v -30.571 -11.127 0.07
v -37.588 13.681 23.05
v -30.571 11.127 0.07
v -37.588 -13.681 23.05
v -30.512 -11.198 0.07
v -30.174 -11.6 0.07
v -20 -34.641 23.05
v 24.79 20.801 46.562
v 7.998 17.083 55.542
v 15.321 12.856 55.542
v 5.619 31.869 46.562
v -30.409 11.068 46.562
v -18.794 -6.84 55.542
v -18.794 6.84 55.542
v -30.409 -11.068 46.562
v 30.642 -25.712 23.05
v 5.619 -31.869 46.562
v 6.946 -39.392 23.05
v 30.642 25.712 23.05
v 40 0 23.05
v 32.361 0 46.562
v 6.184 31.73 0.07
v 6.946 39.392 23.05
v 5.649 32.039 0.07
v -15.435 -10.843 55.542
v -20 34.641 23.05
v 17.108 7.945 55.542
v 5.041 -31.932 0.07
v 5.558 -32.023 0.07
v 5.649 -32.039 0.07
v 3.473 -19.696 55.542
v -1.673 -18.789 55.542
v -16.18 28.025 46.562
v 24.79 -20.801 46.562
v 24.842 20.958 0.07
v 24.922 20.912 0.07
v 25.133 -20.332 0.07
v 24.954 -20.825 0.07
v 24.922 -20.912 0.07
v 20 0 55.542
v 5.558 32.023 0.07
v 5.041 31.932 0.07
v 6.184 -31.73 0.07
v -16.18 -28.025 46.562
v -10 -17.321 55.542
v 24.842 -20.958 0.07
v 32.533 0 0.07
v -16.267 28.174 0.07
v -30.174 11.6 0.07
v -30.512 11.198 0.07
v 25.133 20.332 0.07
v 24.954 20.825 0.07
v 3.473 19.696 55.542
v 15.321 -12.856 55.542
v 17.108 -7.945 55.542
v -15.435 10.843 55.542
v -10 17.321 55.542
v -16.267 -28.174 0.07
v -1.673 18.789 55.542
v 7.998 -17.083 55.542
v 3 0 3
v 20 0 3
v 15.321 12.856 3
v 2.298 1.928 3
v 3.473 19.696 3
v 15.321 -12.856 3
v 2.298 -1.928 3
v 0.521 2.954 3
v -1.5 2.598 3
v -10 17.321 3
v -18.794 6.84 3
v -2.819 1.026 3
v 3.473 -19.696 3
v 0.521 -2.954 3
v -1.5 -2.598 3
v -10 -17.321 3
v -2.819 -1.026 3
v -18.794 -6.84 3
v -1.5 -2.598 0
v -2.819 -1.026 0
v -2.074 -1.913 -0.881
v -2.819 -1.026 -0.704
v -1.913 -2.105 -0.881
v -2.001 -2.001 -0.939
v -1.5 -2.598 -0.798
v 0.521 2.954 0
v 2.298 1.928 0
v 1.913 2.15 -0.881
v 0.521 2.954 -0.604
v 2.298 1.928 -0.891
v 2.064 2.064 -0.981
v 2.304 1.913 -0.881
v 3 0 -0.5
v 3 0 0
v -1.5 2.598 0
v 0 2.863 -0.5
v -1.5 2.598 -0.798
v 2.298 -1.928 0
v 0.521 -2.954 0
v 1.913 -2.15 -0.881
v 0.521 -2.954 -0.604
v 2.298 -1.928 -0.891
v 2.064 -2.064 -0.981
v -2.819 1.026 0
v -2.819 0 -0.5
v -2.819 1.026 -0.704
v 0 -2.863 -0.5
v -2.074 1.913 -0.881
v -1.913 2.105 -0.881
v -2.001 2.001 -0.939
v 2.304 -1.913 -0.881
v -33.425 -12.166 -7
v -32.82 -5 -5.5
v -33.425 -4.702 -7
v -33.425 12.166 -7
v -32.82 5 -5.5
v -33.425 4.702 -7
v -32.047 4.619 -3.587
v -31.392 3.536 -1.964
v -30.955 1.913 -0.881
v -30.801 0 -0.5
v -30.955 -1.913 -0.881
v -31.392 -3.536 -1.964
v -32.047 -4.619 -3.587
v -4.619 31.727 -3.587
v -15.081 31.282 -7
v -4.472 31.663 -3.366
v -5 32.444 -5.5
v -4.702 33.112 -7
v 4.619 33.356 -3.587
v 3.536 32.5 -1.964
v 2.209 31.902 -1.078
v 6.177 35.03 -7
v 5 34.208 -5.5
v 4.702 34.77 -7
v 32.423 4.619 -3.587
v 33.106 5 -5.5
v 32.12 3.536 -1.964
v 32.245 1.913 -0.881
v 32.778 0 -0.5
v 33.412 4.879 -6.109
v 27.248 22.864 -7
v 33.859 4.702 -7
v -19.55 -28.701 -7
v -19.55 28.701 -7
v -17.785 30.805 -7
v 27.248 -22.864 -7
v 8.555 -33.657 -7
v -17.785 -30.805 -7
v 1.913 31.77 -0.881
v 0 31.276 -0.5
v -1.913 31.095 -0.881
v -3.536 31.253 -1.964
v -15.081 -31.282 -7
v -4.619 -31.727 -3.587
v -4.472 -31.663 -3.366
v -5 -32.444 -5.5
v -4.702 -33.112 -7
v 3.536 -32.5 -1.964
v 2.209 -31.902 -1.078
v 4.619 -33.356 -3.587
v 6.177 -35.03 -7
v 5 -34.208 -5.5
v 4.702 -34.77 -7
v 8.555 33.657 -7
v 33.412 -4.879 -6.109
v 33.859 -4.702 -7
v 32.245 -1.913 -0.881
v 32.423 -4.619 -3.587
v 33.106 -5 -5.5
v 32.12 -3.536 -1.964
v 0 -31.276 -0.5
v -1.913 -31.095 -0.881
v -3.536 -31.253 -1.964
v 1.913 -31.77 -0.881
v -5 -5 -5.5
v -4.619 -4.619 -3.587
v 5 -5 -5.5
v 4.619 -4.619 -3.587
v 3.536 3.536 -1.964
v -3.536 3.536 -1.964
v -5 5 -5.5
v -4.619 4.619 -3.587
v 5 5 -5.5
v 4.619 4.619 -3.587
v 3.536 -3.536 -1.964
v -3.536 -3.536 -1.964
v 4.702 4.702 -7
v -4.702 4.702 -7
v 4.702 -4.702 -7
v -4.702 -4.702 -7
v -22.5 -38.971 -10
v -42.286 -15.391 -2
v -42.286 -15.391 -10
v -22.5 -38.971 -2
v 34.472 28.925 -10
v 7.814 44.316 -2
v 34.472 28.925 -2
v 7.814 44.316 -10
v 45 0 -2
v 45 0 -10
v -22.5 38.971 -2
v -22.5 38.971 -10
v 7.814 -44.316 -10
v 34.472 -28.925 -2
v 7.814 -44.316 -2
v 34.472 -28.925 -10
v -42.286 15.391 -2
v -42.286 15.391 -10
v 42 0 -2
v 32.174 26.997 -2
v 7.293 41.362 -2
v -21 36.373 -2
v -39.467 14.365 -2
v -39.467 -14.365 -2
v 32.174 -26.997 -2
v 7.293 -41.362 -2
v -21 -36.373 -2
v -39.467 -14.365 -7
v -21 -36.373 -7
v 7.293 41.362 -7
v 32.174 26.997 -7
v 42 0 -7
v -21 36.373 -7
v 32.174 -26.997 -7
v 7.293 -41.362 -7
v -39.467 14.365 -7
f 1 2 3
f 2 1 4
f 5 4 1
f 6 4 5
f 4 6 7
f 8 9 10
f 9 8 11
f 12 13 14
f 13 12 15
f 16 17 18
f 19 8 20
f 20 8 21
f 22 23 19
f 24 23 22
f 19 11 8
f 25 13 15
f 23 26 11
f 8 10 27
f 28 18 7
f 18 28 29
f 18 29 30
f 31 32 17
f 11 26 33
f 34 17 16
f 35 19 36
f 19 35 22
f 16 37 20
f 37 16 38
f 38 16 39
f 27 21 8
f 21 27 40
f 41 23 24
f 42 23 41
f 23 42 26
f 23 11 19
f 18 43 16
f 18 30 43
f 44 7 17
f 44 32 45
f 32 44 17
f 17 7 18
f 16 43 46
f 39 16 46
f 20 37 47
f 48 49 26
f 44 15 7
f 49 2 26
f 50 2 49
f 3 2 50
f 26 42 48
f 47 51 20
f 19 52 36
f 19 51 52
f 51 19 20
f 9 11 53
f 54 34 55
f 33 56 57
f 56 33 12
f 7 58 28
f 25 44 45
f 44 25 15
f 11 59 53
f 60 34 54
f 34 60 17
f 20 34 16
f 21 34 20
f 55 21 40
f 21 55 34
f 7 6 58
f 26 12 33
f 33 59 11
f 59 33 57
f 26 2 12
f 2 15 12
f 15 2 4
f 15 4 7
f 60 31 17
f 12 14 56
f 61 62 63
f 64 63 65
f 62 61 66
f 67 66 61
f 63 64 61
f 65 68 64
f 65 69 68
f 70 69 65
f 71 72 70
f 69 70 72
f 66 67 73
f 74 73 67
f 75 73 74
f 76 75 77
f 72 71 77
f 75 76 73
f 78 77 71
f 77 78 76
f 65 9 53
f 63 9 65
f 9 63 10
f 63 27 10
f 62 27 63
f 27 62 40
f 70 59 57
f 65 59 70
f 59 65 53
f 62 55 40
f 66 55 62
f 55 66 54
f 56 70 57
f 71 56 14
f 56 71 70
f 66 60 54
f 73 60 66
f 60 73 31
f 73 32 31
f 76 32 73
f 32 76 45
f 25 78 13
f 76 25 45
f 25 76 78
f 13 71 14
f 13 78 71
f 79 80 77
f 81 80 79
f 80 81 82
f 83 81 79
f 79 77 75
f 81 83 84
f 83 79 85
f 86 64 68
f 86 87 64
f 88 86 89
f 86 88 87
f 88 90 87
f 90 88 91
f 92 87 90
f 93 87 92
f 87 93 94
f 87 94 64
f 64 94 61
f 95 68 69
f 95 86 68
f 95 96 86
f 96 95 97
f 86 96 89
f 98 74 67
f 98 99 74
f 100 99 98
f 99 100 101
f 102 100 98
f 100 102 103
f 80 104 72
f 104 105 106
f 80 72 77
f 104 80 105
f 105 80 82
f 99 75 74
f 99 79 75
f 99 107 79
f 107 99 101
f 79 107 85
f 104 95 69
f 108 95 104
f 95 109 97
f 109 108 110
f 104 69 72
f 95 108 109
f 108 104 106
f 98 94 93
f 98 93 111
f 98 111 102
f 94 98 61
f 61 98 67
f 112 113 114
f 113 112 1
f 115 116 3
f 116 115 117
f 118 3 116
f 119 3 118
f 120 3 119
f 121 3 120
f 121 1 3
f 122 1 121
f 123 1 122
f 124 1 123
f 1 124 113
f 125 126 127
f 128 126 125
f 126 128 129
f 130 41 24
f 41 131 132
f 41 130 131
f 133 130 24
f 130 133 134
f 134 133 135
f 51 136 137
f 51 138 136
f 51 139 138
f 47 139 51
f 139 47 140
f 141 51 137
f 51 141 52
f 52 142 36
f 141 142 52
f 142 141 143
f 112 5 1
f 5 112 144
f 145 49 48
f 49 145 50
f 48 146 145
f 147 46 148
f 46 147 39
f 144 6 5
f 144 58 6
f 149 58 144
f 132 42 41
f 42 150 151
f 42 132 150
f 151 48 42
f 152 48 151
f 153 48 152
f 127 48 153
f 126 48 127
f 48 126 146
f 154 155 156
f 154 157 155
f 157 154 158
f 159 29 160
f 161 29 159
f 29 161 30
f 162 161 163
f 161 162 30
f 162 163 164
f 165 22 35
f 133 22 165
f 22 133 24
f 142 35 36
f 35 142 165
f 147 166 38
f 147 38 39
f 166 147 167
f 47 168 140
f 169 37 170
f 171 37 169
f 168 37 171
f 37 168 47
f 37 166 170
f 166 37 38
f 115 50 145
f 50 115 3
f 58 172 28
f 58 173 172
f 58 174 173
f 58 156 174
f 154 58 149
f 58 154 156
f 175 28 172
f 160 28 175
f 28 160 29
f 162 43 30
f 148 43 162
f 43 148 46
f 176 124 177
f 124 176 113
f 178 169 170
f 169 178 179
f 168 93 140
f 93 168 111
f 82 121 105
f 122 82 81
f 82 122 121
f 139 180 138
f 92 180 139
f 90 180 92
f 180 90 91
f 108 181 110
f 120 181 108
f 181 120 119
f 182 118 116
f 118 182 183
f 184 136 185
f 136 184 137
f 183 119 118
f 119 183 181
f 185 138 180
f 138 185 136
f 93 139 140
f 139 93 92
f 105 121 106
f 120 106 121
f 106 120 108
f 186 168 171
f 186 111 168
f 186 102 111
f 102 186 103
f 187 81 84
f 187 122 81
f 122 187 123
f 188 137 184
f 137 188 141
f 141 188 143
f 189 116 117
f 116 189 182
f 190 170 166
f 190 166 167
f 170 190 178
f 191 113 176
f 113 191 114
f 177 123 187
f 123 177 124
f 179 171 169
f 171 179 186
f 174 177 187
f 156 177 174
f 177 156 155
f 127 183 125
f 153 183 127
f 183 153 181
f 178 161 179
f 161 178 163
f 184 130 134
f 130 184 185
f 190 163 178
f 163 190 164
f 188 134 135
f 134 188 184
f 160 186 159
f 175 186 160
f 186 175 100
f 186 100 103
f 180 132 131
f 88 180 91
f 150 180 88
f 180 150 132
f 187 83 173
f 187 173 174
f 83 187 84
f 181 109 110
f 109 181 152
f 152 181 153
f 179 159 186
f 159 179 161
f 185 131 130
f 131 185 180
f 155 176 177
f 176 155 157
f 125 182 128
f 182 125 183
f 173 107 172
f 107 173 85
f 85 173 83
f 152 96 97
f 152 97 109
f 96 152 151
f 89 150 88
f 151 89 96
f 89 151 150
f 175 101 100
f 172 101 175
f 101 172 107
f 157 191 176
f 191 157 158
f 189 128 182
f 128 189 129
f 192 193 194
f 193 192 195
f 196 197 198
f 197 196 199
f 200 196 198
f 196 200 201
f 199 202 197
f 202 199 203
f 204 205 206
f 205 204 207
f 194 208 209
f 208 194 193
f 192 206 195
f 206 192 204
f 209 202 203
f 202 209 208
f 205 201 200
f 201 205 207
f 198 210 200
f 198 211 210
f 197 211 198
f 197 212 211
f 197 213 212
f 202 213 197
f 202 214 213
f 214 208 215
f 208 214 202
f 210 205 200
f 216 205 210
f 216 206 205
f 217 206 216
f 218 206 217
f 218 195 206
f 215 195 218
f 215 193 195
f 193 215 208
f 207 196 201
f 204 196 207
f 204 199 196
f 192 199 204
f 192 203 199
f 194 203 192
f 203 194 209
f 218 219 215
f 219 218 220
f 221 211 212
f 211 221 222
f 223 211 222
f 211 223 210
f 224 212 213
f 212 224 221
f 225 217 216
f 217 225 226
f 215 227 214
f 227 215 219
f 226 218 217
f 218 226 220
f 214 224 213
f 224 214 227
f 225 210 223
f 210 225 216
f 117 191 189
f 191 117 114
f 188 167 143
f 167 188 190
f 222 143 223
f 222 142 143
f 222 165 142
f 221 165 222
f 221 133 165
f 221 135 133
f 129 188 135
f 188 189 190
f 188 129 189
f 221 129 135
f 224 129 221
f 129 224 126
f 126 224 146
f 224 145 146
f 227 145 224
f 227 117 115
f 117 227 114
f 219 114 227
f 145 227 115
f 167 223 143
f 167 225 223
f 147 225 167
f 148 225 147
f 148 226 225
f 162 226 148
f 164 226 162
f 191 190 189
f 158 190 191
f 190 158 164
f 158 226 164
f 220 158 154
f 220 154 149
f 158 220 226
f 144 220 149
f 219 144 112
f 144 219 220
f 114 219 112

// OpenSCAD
/*******************************************************************************  
* Program Name:  POLYPOT
* Created Date:  8/20/2016
* Created By:  M. Graham Cottone
* Purpose: Geometric planter with dranage dish
******************************************************************************** 
POLYPOT (c) by M. Graham Cottone

POLYPOT is licensed under a
Creative Commons Attribution-NonCommercial-ShareAlike 4.0 International License.

You should have received a copy of the license along with this
work. If not, see <http://creativecommons.org/licenses/by-nc-sa/4.0/>.
*******************************************************************************/


//radus of outer width of widest part of main object(top most part)(radus of dish += 5)
rad=40;
//inner radus of the planter
centerHole = 20;
//radus of dranage hole in center of pot
drainHole = 3;
//height of base 
baseHeight= 8;
//half of the width of dranage pipes running through the base
drainPipeWidth= 5;
//depth of the dranage dish 
dishDepth= 5;



//this variable affects the number of sides of the object based on the angle and some fancy trigonometric functions, the math is set for this to be 40, some parts may not align properly if this number is changed.
angle = 40;




//the main object (planter its self)
difference() {
    
    translate ([0, 0, .63*(rad*cos(.5*angle)-1) ])
        sphere($fa=angle, rad );

//cuts out the center hole for plants to live in 
    translate([0,0,3,])
        cylinder($fa=angle, 2*rad,centerHole,centerHole);
        
//cuts extra off bottom at edge
    translate([-rad,-rad,-rad])
        cube([2*rad,2*rad,rad]);

//cuts out drainage hole
     translate([0,0,-3,])
        cylinder($fa=angle, 2*rad,drainHole,drainHole);
}


//the base
difference() {
    translate([0,0,-baseHeight,])
        cylinder($fa=angle, baseHeight+.1,.9*rad,.813*rad);
    
//continues the drainage hole into the base
    translate([0,0,-baseHeight,])
        cylinder($fa=angle, 2*rad,drainHole,drainHole);

//cutout for drain pipe one
    rotate([0,90,0])
 translate([baseHeight-.5*drainPipeWidth,0,-rad,])
        cylinder( 2*rad,drainPipeWidth,drainPipeWidth);

//cutout for drain pipe two
    rotate([90,0,0])
    translate([0,.5*drainPipeWidth-baseHeight,-rad,])
        cylinder( 2*rad,drainPipeWidth,drainPipeWidth);  
}

//the bottom dish
translate ([0, 0,-baseHeight-2 ])
difference() {
    
    translate ([0, 0,0 ])
        cylinder($fa=angle, dishDepth+3,rad+5,rad+5);
       
   
    translate ([0, 0,3 ])
        cylinder($fa=angle, dishDepth+3,rad+2,rad+2);
}
